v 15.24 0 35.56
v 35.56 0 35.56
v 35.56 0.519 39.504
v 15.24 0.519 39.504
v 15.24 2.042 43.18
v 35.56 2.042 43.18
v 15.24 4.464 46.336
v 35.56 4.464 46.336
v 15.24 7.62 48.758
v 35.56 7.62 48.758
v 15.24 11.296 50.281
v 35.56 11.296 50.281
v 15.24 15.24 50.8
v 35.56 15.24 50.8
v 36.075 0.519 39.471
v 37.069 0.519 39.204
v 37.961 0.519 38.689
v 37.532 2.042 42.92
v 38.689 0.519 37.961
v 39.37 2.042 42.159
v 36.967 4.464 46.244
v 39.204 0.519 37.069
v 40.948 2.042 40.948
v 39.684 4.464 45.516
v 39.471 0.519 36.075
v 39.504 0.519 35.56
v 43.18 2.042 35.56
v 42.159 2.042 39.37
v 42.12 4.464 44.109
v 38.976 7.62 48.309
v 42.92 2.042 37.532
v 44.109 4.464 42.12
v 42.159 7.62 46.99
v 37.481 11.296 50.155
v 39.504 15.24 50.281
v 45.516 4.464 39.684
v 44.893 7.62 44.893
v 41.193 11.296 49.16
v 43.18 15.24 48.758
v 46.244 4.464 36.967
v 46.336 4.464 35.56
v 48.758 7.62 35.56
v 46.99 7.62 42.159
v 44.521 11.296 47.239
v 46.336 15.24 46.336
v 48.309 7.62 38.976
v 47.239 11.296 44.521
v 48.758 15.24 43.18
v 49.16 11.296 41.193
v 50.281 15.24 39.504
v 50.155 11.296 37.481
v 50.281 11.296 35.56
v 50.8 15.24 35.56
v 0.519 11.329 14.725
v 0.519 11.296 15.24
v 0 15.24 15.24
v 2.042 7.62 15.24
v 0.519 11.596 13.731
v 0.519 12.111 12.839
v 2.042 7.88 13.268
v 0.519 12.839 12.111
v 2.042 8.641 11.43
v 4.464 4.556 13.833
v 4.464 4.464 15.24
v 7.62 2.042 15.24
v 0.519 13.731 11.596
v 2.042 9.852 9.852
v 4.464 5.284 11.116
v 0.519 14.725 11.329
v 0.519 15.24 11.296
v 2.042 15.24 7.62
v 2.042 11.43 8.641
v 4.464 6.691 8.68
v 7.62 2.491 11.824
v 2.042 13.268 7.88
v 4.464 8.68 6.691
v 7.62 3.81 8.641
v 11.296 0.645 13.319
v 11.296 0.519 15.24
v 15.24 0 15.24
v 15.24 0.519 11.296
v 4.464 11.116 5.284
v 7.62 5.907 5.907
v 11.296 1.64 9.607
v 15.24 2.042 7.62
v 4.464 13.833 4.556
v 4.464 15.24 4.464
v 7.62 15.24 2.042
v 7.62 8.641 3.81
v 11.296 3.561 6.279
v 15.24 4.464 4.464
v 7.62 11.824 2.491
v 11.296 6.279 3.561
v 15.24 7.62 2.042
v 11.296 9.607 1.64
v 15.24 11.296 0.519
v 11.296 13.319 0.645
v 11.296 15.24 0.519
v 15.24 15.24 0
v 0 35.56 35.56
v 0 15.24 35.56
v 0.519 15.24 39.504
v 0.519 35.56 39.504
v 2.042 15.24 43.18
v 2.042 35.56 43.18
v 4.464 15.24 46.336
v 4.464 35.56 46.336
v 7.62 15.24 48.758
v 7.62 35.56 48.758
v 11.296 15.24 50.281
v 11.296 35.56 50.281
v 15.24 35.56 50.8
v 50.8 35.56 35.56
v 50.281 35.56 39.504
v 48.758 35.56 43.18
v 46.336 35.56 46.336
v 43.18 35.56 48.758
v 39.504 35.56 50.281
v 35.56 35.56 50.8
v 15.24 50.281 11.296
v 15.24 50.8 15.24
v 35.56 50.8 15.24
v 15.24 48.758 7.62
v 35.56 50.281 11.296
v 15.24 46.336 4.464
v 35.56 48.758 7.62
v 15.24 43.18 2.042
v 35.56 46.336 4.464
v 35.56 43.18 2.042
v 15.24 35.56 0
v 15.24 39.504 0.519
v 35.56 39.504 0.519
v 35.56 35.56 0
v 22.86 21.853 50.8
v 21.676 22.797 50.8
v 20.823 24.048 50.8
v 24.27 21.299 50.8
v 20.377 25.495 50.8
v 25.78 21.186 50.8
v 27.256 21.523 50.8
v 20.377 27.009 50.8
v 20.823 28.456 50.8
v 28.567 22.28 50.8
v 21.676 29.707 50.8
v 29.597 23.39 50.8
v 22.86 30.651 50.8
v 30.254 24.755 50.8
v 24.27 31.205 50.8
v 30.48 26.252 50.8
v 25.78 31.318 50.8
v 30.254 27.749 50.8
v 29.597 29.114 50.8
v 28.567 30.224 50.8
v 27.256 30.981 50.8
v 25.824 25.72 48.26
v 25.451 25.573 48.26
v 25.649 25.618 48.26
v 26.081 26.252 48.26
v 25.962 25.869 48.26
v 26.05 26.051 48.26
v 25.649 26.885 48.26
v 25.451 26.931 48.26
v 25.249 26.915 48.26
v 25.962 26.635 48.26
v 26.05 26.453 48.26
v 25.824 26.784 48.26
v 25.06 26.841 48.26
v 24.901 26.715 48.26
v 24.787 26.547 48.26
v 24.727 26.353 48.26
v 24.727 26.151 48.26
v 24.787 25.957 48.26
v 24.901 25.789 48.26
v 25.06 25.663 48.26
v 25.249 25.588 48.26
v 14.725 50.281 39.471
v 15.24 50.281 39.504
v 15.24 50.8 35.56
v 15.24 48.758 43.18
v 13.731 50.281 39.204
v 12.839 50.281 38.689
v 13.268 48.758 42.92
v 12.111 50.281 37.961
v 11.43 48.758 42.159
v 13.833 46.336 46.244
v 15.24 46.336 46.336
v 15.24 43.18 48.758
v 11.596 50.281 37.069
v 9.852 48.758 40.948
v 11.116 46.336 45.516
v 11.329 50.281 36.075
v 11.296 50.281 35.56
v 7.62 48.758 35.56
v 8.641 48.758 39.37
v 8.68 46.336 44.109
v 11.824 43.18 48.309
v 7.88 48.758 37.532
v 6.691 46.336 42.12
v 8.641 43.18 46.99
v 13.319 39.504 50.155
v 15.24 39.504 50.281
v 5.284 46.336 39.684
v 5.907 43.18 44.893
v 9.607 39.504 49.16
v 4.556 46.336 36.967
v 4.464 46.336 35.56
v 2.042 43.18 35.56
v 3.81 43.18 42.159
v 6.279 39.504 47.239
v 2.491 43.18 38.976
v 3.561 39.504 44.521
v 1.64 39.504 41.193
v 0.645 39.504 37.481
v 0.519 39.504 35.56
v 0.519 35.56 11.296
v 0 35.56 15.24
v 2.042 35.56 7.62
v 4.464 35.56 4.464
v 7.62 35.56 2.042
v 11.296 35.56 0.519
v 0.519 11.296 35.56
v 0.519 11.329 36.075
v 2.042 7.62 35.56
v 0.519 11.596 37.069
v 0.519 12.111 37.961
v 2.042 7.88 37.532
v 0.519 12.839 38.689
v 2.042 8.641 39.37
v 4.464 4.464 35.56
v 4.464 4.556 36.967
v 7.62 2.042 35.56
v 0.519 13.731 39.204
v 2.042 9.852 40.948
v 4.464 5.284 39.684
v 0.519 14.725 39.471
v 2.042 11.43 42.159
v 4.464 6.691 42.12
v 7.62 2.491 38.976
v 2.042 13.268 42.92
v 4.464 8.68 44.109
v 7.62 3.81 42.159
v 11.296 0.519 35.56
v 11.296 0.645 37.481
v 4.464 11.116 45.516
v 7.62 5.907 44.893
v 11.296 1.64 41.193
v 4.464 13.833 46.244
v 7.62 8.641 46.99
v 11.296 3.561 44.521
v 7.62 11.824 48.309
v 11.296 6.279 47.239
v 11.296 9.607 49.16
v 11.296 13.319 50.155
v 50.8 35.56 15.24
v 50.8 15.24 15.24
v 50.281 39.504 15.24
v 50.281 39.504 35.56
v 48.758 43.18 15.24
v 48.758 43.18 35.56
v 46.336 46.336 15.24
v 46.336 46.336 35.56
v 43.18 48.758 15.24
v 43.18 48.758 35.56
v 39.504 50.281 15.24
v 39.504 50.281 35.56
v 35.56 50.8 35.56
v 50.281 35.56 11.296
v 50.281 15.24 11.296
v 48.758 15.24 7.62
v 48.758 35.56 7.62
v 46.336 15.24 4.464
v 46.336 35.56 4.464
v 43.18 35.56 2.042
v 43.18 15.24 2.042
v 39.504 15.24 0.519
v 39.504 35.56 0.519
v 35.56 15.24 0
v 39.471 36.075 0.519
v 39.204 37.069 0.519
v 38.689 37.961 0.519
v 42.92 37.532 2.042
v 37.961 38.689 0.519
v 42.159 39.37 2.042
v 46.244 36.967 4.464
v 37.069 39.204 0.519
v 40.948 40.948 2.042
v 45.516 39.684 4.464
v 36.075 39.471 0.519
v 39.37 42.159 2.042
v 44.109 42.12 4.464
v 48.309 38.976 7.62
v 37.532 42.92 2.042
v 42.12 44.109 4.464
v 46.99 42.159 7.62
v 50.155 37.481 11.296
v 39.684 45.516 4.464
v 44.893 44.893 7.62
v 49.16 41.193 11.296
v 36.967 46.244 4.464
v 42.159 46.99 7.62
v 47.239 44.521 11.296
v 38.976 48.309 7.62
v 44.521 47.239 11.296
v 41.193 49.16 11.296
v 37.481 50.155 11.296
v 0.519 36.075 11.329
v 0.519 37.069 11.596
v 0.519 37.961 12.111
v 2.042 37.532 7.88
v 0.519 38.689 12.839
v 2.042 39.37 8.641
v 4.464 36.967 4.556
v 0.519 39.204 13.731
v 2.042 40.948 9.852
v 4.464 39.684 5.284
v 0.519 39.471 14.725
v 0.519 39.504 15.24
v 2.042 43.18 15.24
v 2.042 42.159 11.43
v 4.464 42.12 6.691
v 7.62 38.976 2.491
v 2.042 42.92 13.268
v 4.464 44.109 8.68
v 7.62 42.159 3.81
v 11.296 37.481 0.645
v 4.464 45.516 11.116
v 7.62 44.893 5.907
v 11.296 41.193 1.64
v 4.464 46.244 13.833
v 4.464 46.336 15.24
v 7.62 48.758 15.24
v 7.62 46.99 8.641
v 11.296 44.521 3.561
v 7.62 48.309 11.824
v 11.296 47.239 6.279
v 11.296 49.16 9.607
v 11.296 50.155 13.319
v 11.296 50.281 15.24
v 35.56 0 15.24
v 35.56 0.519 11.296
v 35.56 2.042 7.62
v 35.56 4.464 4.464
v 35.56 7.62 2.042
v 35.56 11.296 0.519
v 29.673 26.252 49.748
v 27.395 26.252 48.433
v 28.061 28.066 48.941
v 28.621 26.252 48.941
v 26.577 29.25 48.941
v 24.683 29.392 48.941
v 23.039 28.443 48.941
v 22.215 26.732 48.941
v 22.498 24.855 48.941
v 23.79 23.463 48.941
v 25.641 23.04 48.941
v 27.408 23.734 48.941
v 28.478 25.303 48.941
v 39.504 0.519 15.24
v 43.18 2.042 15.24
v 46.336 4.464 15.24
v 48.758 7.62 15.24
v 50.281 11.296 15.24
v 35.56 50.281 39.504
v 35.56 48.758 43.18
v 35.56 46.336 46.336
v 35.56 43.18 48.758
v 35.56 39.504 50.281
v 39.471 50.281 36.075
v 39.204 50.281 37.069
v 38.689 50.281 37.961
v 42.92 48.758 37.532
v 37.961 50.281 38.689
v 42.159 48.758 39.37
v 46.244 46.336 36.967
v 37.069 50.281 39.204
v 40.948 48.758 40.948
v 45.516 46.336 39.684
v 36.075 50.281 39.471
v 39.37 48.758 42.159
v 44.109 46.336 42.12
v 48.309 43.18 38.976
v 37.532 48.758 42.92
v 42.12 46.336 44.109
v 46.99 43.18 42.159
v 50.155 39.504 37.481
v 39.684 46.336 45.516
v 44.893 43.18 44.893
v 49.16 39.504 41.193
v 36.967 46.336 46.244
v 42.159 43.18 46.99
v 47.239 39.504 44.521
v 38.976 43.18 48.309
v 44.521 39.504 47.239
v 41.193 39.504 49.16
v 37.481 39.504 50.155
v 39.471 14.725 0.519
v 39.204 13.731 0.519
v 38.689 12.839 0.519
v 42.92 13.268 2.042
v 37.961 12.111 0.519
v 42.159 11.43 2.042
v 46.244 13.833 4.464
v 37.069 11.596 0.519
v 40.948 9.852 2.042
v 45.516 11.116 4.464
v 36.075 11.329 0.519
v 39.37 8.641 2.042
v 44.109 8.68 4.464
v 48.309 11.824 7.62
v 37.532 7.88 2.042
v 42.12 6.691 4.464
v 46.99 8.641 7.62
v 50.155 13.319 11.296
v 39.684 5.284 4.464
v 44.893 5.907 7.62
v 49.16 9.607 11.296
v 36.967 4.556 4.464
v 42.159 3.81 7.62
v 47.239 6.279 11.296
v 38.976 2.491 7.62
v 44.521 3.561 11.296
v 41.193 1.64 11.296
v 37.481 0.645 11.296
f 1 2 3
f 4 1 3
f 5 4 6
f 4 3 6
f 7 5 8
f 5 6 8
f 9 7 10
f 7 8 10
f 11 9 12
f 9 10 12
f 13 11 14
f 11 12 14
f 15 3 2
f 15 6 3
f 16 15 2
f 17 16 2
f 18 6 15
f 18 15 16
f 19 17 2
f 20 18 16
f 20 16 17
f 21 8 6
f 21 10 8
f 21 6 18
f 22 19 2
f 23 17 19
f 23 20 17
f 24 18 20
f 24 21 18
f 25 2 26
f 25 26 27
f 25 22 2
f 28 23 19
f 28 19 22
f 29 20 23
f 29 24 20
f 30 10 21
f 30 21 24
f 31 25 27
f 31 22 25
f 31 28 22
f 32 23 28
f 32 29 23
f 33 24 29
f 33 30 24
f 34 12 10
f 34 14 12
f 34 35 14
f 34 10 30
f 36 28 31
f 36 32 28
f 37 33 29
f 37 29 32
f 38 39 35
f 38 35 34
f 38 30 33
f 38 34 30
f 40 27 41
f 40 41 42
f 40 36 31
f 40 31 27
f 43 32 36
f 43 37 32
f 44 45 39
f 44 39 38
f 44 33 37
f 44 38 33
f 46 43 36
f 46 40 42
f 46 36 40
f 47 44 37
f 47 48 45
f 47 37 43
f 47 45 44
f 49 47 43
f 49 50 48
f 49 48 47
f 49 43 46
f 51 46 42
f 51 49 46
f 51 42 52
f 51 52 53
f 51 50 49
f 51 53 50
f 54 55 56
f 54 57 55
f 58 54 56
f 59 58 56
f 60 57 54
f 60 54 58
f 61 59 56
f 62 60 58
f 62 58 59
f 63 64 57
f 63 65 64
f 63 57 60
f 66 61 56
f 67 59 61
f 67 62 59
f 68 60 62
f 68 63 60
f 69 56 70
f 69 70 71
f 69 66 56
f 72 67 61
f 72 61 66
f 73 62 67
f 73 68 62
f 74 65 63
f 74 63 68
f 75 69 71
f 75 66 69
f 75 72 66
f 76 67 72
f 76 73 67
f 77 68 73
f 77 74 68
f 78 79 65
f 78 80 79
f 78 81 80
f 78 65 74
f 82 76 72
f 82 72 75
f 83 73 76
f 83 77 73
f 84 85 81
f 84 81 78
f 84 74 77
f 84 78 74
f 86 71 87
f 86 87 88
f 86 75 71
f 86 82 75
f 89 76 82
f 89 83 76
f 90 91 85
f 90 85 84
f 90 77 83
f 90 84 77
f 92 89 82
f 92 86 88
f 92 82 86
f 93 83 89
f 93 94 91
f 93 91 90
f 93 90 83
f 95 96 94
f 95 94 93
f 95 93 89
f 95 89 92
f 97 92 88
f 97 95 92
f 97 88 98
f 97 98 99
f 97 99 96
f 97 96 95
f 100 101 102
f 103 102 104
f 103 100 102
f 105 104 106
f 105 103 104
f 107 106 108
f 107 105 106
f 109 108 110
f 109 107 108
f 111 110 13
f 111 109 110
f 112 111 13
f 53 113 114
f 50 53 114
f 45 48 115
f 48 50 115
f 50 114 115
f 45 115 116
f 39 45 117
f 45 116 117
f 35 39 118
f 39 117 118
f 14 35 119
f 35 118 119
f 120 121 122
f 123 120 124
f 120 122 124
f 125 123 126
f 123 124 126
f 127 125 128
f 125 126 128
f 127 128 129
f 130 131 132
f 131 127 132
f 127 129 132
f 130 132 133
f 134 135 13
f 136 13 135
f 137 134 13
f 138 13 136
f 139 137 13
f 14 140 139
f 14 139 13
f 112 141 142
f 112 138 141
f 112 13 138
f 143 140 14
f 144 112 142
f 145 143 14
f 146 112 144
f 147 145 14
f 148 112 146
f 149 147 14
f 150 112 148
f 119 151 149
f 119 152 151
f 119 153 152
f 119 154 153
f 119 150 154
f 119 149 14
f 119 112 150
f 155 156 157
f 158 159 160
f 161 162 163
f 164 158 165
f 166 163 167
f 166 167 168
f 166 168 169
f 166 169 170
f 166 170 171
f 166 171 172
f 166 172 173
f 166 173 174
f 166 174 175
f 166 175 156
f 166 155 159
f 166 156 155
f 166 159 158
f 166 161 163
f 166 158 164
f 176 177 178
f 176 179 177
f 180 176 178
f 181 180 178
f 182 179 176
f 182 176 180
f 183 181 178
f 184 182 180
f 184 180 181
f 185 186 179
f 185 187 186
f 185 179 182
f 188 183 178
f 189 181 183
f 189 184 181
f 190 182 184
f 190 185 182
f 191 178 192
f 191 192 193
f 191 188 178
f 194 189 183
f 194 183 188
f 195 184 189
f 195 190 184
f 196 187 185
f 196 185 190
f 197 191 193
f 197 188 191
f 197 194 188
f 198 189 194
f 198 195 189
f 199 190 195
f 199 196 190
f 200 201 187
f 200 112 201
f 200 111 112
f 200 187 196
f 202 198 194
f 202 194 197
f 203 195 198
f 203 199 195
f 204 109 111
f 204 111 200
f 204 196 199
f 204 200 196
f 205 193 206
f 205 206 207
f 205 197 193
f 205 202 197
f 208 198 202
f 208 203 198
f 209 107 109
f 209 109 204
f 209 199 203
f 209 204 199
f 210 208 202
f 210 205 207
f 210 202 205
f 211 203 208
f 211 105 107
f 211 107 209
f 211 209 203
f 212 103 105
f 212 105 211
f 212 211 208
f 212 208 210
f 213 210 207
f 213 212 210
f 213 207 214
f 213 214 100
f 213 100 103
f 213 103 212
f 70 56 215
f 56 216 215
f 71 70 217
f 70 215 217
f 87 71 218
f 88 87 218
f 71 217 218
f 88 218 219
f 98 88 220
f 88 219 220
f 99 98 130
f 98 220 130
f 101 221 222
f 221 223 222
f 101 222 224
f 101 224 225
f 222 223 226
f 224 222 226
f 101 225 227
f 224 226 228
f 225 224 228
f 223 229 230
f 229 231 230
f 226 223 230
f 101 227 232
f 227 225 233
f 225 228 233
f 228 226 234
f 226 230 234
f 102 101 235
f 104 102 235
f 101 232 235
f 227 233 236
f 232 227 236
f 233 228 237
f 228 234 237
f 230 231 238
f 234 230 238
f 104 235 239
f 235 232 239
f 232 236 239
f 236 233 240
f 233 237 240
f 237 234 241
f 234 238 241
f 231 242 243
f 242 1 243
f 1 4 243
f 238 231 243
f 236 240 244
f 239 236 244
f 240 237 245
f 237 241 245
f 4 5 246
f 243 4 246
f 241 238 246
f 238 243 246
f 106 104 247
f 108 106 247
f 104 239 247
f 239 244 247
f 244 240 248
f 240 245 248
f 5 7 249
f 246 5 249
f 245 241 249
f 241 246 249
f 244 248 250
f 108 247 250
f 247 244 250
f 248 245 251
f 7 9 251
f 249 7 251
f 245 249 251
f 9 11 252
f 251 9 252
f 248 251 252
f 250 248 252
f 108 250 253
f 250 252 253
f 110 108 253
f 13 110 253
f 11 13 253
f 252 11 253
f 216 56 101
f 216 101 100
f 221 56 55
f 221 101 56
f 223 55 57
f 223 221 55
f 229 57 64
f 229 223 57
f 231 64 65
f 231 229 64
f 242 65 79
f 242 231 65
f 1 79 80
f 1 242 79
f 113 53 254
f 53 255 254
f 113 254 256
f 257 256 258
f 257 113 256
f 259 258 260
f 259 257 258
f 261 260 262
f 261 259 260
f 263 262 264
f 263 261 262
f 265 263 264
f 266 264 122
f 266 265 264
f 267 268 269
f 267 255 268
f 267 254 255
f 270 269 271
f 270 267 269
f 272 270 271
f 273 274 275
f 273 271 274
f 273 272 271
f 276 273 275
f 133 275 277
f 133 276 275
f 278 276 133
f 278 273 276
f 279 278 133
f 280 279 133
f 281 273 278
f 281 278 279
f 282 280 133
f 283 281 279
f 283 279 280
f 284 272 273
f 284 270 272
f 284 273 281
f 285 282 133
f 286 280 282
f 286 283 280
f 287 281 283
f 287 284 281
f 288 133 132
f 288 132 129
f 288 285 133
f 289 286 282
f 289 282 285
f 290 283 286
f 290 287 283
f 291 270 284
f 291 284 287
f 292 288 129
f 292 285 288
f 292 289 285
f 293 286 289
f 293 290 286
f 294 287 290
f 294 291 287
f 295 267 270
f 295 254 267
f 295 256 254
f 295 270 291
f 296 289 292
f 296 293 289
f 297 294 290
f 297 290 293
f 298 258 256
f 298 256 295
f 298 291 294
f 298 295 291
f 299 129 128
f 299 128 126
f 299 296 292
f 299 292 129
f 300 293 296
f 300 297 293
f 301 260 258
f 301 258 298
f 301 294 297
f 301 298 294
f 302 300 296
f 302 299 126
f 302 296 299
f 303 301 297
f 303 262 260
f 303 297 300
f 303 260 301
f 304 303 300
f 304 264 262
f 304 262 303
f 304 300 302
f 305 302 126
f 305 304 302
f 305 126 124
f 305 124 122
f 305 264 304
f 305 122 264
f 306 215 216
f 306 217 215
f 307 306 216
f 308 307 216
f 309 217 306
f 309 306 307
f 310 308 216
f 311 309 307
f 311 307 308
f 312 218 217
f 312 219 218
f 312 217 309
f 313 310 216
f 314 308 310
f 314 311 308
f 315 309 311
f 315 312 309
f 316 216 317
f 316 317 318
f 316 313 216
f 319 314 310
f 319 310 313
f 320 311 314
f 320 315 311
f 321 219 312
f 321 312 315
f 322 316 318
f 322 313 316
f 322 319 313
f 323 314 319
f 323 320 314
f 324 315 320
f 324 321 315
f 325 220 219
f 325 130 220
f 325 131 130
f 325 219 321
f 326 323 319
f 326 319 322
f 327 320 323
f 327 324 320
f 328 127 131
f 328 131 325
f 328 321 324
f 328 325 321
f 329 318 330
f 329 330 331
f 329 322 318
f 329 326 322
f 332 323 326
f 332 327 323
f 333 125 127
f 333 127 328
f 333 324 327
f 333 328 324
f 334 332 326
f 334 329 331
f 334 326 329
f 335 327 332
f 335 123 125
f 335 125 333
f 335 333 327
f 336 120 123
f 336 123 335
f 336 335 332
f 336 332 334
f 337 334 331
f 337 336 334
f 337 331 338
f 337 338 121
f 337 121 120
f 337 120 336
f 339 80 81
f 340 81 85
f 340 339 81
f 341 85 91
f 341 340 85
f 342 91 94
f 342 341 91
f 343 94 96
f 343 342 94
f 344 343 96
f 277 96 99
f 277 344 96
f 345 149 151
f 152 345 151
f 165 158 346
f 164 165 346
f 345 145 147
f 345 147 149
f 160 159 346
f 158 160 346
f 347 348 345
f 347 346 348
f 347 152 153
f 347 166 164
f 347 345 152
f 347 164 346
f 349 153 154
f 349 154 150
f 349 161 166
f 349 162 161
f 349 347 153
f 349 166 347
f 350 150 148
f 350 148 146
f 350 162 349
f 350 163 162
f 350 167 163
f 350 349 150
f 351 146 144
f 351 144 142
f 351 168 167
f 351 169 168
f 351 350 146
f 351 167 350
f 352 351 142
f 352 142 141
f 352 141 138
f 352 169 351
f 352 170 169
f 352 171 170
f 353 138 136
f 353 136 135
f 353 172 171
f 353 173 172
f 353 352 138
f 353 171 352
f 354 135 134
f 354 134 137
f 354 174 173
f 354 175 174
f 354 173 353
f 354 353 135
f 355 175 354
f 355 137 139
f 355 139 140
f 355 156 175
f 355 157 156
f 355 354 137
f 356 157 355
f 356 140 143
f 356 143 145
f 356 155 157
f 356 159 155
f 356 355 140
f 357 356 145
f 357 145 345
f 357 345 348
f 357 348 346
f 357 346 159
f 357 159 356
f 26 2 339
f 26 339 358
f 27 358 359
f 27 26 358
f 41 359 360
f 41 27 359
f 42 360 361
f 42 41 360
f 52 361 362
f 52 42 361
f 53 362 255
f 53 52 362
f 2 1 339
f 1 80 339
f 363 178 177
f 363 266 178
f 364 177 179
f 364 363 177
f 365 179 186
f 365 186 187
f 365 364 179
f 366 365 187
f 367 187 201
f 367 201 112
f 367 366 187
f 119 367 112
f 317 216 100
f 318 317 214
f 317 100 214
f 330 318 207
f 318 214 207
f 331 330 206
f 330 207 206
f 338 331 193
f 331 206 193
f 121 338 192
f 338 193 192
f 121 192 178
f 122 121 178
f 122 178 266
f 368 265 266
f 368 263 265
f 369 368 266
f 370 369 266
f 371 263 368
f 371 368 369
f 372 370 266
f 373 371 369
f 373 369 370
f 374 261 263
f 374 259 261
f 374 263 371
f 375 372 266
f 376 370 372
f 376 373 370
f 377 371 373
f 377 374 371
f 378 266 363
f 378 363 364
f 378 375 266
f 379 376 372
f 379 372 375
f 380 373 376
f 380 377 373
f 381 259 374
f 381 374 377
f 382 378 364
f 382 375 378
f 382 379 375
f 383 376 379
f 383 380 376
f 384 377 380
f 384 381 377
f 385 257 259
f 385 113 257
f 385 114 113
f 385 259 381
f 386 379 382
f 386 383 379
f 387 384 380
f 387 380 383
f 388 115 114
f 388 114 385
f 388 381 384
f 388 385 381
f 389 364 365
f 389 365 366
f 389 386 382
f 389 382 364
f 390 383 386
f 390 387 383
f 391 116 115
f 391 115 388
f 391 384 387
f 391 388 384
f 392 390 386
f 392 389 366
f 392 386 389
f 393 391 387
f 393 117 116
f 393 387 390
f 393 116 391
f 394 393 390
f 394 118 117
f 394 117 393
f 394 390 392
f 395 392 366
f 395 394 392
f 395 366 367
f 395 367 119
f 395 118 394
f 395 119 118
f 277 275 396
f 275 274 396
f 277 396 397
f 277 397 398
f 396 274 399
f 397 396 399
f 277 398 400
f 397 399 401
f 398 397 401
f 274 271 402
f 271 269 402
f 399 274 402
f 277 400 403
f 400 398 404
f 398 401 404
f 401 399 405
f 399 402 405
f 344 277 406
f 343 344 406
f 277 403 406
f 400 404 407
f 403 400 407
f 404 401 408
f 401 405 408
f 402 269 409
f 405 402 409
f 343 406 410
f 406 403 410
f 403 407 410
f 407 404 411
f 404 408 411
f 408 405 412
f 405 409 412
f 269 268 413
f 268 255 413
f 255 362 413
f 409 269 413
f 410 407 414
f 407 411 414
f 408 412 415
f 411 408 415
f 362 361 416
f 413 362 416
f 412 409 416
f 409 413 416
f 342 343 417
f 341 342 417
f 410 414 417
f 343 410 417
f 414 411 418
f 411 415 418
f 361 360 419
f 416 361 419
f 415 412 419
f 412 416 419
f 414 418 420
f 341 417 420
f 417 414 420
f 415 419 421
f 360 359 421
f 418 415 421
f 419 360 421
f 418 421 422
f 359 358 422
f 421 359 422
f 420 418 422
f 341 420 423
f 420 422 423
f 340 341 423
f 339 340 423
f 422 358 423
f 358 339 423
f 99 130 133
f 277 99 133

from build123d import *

# Parameters (mm, degrees)
F0_W     = 50.8
F0_H     = 50.8
F1_DEPTH = 50.8
F2_R     = 15.24
F3_R     = 5.08
F4_DEPTH = 2.54


# Not quite as in the source:
# - a fillet or chamfer that OpenCascade refuses, or shapes differently, is made with other operations: its cross-section is extruded or revolved along the edge and cut away or added


with BuildPart() as f1:
    # F0 (on Top) → F1 (new body)
    with BuildSketch(Plane.XY):
        with Locations((25.4, 25.4)):
            Rectangle(F0_W, F0_H)
    extrude(amount=F1_DEPTH)

    # F2
    f2_edges = [f1.edges().sort_by_distance(p)[0] for p in [
        (50.8, 25.4, 50.8),
        (25.4, 0, 50.8),
        (50.8, 0, 25.4),
        (50.8, 50.8, 25.4),
        (50.8, 25.4, 0),
        (25.4, 0, 0),
        (0, 0, 25.4),
        (0, 25.4, 50.8),
        (25.4, 50.8, 50.8),
        (25.4, 50.8, 0),
        (0, 25.4, 0),
        (0, 50.8, 25.4),
    ]]
    fillet(f2_edges, radius=F2_R)

    # F3 (on face) → F4 (cut)
    with BuildSketch(Plane.XY.offset(50.8)):
        with Locations((25.4, 26.2519493699)):
            Circle(F3_R)
    extrude(amount=-F4_DEPTH, mode=Mode.SUBTRACT)

    # F5: fillet of radius 5.08 on 1 edges, made by hand

    # F5_s1 → F5_t2 (revolve)
    with BuildSketch(Plane.XZ.offset(-26.2519493699)):
        with BuildLine():
            ThreePointArc((30.48, 50.8), (28.6205909488, 48.9405909488), (26.0805909488, 48.26))
            Line((26.0805909488, 48.26), (30.48, 48.26))
            Line((30.48, 48.26), (30.48, 50.8))
        make_face()
    revolve(axis=Axis((25.4, 26.2519493699, 48.26), (0, 0, 1)))


solid = f1.part
